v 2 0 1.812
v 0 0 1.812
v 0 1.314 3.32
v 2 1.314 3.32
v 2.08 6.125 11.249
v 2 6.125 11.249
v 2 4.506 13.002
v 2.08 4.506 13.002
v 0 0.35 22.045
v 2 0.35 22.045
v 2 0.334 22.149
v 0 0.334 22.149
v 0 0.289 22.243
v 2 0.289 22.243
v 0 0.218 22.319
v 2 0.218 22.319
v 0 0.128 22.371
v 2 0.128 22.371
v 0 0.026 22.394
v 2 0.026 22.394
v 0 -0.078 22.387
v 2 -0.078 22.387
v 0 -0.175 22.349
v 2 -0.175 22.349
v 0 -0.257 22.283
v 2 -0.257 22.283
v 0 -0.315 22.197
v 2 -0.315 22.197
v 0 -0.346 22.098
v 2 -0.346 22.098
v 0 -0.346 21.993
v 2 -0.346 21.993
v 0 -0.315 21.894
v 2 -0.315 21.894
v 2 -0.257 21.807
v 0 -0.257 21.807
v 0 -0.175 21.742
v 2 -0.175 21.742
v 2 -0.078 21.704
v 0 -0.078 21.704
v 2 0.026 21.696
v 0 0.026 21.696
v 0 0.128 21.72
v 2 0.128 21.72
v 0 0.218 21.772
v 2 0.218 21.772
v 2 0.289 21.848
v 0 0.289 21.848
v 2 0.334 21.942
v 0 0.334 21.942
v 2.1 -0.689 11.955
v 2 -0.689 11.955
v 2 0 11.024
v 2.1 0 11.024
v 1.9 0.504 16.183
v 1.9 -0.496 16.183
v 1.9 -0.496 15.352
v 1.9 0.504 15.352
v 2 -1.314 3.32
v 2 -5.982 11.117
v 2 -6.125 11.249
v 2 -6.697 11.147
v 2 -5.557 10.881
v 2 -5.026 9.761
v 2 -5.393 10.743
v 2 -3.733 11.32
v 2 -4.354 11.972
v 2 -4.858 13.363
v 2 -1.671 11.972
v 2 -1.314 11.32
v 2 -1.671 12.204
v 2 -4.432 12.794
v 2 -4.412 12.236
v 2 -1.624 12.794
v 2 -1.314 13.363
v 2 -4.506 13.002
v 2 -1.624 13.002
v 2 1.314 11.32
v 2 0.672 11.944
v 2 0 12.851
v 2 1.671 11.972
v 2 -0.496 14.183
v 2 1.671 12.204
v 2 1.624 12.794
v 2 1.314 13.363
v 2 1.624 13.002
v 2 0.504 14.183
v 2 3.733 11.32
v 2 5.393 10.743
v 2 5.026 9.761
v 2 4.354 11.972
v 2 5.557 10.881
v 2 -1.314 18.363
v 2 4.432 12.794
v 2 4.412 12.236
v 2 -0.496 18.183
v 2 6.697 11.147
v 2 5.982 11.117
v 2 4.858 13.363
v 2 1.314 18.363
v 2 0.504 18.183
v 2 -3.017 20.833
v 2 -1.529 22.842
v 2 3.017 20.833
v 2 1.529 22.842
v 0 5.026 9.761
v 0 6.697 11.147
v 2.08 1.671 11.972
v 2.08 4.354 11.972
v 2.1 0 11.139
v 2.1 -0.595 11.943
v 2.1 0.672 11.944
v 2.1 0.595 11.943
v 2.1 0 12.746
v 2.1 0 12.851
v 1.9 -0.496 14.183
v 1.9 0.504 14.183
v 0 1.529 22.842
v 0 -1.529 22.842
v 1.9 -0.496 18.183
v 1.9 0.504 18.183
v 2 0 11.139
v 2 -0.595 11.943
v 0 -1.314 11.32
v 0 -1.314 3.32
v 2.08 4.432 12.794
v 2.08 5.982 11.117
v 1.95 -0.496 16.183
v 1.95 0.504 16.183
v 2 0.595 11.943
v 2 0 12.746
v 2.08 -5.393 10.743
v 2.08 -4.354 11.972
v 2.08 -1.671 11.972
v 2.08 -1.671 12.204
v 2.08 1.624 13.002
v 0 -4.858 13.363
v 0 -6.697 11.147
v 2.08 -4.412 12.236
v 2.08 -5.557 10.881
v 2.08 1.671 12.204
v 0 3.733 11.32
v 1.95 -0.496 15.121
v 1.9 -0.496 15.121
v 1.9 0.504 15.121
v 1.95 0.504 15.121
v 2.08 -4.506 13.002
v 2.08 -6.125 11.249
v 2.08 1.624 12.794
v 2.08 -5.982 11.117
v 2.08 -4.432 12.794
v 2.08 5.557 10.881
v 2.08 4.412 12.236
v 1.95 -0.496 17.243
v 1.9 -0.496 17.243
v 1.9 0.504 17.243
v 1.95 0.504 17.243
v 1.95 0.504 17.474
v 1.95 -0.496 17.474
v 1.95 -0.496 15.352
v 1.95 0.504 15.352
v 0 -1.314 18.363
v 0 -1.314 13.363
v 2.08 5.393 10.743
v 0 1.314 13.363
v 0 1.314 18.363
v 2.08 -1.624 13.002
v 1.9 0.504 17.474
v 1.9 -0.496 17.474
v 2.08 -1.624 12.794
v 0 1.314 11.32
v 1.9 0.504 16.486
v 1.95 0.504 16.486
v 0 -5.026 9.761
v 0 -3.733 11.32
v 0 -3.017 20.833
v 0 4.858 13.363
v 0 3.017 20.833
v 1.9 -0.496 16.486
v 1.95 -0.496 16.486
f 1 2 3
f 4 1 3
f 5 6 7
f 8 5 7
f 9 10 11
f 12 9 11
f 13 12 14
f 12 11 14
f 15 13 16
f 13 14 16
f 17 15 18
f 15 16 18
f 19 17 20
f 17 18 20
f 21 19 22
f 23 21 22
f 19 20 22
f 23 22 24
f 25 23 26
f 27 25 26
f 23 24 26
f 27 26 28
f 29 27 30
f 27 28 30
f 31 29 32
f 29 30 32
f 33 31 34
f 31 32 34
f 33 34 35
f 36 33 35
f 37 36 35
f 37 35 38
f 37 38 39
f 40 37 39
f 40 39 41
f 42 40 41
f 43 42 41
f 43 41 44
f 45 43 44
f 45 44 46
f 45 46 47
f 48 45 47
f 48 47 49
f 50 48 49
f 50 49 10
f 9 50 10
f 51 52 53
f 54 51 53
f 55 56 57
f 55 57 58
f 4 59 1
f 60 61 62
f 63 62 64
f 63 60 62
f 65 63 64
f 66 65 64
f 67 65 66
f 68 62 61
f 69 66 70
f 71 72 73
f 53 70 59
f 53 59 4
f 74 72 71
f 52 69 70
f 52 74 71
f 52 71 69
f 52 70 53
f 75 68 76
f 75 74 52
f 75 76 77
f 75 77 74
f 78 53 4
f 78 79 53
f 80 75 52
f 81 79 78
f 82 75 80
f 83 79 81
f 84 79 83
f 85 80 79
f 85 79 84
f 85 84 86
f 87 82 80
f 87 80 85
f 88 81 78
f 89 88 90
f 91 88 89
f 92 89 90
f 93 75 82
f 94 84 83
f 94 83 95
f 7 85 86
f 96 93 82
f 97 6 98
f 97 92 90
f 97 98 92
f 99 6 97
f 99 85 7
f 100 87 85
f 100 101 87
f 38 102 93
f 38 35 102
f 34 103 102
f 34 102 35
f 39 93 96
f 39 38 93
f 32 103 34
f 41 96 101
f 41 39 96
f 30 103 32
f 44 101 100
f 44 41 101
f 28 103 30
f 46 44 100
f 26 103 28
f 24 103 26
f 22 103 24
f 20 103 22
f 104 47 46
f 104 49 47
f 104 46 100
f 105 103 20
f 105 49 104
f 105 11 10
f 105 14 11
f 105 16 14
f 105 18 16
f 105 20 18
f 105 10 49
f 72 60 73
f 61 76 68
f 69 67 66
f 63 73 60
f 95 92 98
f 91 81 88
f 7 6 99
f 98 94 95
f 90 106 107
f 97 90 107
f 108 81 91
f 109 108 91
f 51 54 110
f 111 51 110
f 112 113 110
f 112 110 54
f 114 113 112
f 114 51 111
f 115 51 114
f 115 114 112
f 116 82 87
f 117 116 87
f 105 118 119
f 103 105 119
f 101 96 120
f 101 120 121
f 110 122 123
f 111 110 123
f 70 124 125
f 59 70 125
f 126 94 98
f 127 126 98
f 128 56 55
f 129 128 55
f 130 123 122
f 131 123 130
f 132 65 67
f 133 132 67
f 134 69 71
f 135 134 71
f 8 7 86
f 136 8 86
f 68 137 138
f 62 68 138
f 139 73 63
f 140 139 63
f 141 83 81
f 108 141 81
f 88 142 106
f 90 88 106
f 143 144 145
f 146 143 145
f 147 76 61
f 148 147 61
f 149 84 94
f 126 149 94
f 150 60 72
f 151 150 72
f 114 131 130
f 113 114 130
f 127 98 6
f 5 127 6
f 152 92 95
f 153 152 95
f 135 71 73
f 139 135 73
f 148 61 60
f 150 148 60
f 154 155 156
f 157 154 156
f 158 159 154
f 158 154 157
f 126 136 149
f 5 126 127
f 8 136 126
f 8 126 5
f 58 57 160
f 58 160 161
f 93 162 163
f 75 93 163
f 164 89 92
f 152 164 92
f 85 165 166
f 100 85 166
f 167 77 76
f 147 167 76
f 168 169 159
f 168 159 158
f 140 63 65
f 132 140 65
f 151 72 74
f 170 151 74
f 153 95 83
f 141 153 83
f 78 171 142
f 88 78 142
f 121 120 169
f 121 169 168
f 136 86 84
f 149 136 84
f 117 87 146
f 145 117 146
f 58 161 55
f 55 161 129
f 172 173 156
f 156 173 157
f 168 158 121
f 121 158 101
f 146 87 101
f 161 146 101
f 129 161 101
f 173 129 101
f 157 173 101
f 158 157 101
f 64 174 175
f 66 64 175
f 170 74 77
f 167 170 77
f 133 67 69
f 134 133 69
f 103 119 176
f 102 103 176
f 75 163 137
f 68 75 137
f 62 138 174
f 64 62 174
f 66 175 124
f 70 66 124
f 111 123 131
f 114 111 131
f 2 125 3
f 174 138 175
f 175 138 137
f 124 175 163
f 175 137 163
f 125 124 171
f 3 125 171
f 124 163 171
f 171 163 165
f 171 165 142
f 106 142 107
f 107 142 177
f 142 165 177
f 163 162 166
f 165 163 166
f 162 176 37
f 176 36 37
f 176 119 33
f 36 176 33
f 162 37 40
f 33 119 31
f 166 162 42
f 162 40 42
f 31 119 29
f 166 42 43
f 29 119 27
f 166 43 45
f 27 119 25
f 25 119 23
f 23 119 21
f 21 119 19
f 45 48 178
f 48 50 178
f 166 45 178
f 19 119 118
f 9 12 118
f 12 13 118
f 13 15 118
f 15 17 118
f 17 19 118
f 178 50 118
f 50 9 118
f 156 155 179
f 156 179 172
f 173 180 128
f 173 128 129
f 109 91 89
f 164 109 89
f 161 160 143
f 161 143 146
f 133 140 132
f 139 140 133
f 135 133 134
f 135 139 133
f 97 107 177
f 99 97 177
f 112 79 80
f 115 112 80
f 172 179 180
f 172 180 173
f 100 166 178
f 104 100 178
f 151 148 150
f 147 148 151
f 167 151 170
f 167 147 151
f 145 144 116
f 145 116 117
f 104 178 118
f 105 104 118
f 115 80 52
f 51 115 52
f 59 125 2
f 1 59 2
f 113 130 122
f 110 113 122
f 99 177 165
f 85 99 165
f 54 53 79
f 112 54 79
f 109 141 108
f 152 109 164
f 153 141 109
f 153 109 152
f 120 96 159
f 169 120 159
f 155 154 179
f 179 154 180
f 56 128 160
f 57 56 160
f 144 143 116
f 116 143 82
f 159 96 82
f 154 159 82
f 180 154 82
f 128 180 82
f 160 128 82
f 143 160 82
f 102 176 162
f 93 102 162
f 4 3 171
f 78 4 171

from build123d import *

# Parameters (mm, degrees)
F1_DEPTH  = 2
F2_R      = 0.35
F3_DEPTH  = 25
F4_W      = 1
F4_H      = 1.0295459899
F4_H_2    = 1.2896113173
F4_H_3    = 0.8533134981
F4_H_4    = 0.8275291947
F5_DEPTH  = 0.1
F6_W      = 1
F6_H      = 0.3036903766
F6_H_2    = 0.2311002463
F7_DEPTH  = 0.05
F9_DEPTH  = 0.1
F11_DEPTH = 0.4
F13_DEPTH = 0.15
F15_DEPTH = 0.08
F17_DEPTH = 0.08


with BuildPart() as f1:
    # F0 (on Right) → F1 (new body)
    with BuildSketch(Plane.YZ):
        Polygon((1.5289138055, 22.8420257282), (-1.5289138055, 22.8420257282), (-3.0169833821, 20.8331332634), (-1.3137839247, 18.3634953125), (-1.3137839247, 13.3634953125), (-4.8581478186, 13.3634953125), (-6.6966588007, 11.1467856193), (-5.026220344, 9.7613450914), (-3.7333500412, 11.3201707717), (-1.3137839247, 11.3201707717), (-1.3137839247, 3.3201707717), (0, 1.8122013425), (1.3137839247, 3.3201707717), (1.3137839247, 11.3201707717), (3.7333500412, 11.3201707717), (5.026220344, 9.7613450914), (6.6966588007, 11.1467856193), (4.8581478186, 13.3634953125), (1.3137839247, 13.3634953125), (1.3137839247, 18.3634953125), (3.0169833821, 20.8331332634), align=None)
    extrude(amount=F1_DEPTH)

    # F2 (on face) → F3 (cut)
    with BuildSketch(Plane.YZ.offset(2)):
        with Locations((0, 22.045429796)):
            Circle(F2_R)
    extrude(amount=-F3_DEPTH, mode=Mode.SUBTRACT)

    # F4 (on face) → F5 (cut)
    with BuildSketch(Plane.YZ.offset(2)):
        with Locations((0.0044090512, 17.6678796248)):
            Rectangle(F4_W, F4_H)
        with Locations((0.0044090512, 16.5083009712)):
            Rectangle(F4_W, F4_H_2)
        with Locations((0.0044090512, 15.4368385635)):
            Rectangle(F4_W, F4_H_3)
        with Locations((0.0044090512, 14.5964172171)):
            Rectangle(F4_W, F4_H_4)
    extrude(amount=-F5_DEPTH, mode=Mode.SUBTRACT)

    # F6 (on face) → F7 (join)
    with BuildSketch(Plane.YZ.offset(1.9)):
        with Locations((0.0044090512, 16.3344978081)):
            Rectangle(F6_W, F6_H)
        with Locations((0.0044090512, 15.2363022789)):
            Rectangle(F6_W, F6_H_2)
        with Locations((0.0044090512, 17.3582183197)):
            Rectangle(F6_W, F6_H_2)
    extrude(amount=F7_DEPTH)

    # F8 (on face) → F9 (join)
    with BuildSketch(Plane.YZ.offset(2)):
        Polygon((0.6717516341, 11.9438935243), (0, 12.8511385992), (-0.6890961678, 11.9545630374), (0, 11.023893021), align=None)
        Polygon((-0.5950663771, 11.94282338), (0, 12.7464999361), (0.5950663771, 11.94282338), (0, 11.1391468239), align=None, mode=Mode.SUBTRACT)
    extrude(amount=F9_DEPTH)

    # F10 (on face) → F11 (join)
    with BuildSketch(Plane.YZ.offset(2)):
        Polygon((4.5327297412, 12.9496529698), (1.7276167603, 12.9496529698), (1.7402404919, 12.7224316821), (4.4722869851, 12.7224316821), (5.6972301676, 11.2874979167), (5.8443970047, 11.4131281152), align=None)
    extrude(amount=-F11_DEPTH)

    # F12 (on face) → F13 (join)
    with BuildSketch(Plane.YZ.offset(2)):
        Polygon((4.5460160027, 13.0201727152), (1.7085982254, 13.0201727152), (1.7085982254, 12.9053406417), (4.4910646975, 12.9053406417), (5.7453825139, 11.386025697), (5.8344381178, 11.4595483271), align=None)
    extrude(amount=-F13_DEPTH)

    # F14 (on face) → F15 (join)
    with BuildSketch(Plane.YZ.offset(2)):
        Polygon((-4.4317739084, 12.7944620326), (-1.6240546247, 12.7944620326), (-1.6240546247, 13.0023704842), (-4.5060524717, 13.0023704842), (-6.1253183521, 11.2494025379), (-5.9816107865, 11.1166558107), align=None)
        Polygon((1.6240546247, 13.0023704842), (1.6240546247, 12.7944620326), (4.4317739084, 12.7944620326), (5.9816107865, 11.1166558107), (6.1253183521, 11.2494025379), (4.5060524717, 13.0023704842), align=None)
    extrude(amount=F15_DEPTH)

    # F16 (on face) → F17 (join)
    with BuildSketch(Plane.YZ.offset(2)):
        Polygon((-1.6705167945, 11.9723323733), (-1.6705167945, 12.2044812888), (-4.411512593, 12.2358226389), (-5.5567457362, 10.8810874), (-5.3931535222, 10.742793791), (-4.353756085, 11.9723323733), align=None)
        Polygon((4.411512593, 12.2358226389), (1.6705167945, 12.2044812888), (1.6705167945, 11.9723323733), (4.353756085, 11.9723323733), (5.3931535222, 10.742793791), (5.5567457362, 10.8810874), align=None)
    extrude(amount=F17_DEPTH)


solid = f1.part
